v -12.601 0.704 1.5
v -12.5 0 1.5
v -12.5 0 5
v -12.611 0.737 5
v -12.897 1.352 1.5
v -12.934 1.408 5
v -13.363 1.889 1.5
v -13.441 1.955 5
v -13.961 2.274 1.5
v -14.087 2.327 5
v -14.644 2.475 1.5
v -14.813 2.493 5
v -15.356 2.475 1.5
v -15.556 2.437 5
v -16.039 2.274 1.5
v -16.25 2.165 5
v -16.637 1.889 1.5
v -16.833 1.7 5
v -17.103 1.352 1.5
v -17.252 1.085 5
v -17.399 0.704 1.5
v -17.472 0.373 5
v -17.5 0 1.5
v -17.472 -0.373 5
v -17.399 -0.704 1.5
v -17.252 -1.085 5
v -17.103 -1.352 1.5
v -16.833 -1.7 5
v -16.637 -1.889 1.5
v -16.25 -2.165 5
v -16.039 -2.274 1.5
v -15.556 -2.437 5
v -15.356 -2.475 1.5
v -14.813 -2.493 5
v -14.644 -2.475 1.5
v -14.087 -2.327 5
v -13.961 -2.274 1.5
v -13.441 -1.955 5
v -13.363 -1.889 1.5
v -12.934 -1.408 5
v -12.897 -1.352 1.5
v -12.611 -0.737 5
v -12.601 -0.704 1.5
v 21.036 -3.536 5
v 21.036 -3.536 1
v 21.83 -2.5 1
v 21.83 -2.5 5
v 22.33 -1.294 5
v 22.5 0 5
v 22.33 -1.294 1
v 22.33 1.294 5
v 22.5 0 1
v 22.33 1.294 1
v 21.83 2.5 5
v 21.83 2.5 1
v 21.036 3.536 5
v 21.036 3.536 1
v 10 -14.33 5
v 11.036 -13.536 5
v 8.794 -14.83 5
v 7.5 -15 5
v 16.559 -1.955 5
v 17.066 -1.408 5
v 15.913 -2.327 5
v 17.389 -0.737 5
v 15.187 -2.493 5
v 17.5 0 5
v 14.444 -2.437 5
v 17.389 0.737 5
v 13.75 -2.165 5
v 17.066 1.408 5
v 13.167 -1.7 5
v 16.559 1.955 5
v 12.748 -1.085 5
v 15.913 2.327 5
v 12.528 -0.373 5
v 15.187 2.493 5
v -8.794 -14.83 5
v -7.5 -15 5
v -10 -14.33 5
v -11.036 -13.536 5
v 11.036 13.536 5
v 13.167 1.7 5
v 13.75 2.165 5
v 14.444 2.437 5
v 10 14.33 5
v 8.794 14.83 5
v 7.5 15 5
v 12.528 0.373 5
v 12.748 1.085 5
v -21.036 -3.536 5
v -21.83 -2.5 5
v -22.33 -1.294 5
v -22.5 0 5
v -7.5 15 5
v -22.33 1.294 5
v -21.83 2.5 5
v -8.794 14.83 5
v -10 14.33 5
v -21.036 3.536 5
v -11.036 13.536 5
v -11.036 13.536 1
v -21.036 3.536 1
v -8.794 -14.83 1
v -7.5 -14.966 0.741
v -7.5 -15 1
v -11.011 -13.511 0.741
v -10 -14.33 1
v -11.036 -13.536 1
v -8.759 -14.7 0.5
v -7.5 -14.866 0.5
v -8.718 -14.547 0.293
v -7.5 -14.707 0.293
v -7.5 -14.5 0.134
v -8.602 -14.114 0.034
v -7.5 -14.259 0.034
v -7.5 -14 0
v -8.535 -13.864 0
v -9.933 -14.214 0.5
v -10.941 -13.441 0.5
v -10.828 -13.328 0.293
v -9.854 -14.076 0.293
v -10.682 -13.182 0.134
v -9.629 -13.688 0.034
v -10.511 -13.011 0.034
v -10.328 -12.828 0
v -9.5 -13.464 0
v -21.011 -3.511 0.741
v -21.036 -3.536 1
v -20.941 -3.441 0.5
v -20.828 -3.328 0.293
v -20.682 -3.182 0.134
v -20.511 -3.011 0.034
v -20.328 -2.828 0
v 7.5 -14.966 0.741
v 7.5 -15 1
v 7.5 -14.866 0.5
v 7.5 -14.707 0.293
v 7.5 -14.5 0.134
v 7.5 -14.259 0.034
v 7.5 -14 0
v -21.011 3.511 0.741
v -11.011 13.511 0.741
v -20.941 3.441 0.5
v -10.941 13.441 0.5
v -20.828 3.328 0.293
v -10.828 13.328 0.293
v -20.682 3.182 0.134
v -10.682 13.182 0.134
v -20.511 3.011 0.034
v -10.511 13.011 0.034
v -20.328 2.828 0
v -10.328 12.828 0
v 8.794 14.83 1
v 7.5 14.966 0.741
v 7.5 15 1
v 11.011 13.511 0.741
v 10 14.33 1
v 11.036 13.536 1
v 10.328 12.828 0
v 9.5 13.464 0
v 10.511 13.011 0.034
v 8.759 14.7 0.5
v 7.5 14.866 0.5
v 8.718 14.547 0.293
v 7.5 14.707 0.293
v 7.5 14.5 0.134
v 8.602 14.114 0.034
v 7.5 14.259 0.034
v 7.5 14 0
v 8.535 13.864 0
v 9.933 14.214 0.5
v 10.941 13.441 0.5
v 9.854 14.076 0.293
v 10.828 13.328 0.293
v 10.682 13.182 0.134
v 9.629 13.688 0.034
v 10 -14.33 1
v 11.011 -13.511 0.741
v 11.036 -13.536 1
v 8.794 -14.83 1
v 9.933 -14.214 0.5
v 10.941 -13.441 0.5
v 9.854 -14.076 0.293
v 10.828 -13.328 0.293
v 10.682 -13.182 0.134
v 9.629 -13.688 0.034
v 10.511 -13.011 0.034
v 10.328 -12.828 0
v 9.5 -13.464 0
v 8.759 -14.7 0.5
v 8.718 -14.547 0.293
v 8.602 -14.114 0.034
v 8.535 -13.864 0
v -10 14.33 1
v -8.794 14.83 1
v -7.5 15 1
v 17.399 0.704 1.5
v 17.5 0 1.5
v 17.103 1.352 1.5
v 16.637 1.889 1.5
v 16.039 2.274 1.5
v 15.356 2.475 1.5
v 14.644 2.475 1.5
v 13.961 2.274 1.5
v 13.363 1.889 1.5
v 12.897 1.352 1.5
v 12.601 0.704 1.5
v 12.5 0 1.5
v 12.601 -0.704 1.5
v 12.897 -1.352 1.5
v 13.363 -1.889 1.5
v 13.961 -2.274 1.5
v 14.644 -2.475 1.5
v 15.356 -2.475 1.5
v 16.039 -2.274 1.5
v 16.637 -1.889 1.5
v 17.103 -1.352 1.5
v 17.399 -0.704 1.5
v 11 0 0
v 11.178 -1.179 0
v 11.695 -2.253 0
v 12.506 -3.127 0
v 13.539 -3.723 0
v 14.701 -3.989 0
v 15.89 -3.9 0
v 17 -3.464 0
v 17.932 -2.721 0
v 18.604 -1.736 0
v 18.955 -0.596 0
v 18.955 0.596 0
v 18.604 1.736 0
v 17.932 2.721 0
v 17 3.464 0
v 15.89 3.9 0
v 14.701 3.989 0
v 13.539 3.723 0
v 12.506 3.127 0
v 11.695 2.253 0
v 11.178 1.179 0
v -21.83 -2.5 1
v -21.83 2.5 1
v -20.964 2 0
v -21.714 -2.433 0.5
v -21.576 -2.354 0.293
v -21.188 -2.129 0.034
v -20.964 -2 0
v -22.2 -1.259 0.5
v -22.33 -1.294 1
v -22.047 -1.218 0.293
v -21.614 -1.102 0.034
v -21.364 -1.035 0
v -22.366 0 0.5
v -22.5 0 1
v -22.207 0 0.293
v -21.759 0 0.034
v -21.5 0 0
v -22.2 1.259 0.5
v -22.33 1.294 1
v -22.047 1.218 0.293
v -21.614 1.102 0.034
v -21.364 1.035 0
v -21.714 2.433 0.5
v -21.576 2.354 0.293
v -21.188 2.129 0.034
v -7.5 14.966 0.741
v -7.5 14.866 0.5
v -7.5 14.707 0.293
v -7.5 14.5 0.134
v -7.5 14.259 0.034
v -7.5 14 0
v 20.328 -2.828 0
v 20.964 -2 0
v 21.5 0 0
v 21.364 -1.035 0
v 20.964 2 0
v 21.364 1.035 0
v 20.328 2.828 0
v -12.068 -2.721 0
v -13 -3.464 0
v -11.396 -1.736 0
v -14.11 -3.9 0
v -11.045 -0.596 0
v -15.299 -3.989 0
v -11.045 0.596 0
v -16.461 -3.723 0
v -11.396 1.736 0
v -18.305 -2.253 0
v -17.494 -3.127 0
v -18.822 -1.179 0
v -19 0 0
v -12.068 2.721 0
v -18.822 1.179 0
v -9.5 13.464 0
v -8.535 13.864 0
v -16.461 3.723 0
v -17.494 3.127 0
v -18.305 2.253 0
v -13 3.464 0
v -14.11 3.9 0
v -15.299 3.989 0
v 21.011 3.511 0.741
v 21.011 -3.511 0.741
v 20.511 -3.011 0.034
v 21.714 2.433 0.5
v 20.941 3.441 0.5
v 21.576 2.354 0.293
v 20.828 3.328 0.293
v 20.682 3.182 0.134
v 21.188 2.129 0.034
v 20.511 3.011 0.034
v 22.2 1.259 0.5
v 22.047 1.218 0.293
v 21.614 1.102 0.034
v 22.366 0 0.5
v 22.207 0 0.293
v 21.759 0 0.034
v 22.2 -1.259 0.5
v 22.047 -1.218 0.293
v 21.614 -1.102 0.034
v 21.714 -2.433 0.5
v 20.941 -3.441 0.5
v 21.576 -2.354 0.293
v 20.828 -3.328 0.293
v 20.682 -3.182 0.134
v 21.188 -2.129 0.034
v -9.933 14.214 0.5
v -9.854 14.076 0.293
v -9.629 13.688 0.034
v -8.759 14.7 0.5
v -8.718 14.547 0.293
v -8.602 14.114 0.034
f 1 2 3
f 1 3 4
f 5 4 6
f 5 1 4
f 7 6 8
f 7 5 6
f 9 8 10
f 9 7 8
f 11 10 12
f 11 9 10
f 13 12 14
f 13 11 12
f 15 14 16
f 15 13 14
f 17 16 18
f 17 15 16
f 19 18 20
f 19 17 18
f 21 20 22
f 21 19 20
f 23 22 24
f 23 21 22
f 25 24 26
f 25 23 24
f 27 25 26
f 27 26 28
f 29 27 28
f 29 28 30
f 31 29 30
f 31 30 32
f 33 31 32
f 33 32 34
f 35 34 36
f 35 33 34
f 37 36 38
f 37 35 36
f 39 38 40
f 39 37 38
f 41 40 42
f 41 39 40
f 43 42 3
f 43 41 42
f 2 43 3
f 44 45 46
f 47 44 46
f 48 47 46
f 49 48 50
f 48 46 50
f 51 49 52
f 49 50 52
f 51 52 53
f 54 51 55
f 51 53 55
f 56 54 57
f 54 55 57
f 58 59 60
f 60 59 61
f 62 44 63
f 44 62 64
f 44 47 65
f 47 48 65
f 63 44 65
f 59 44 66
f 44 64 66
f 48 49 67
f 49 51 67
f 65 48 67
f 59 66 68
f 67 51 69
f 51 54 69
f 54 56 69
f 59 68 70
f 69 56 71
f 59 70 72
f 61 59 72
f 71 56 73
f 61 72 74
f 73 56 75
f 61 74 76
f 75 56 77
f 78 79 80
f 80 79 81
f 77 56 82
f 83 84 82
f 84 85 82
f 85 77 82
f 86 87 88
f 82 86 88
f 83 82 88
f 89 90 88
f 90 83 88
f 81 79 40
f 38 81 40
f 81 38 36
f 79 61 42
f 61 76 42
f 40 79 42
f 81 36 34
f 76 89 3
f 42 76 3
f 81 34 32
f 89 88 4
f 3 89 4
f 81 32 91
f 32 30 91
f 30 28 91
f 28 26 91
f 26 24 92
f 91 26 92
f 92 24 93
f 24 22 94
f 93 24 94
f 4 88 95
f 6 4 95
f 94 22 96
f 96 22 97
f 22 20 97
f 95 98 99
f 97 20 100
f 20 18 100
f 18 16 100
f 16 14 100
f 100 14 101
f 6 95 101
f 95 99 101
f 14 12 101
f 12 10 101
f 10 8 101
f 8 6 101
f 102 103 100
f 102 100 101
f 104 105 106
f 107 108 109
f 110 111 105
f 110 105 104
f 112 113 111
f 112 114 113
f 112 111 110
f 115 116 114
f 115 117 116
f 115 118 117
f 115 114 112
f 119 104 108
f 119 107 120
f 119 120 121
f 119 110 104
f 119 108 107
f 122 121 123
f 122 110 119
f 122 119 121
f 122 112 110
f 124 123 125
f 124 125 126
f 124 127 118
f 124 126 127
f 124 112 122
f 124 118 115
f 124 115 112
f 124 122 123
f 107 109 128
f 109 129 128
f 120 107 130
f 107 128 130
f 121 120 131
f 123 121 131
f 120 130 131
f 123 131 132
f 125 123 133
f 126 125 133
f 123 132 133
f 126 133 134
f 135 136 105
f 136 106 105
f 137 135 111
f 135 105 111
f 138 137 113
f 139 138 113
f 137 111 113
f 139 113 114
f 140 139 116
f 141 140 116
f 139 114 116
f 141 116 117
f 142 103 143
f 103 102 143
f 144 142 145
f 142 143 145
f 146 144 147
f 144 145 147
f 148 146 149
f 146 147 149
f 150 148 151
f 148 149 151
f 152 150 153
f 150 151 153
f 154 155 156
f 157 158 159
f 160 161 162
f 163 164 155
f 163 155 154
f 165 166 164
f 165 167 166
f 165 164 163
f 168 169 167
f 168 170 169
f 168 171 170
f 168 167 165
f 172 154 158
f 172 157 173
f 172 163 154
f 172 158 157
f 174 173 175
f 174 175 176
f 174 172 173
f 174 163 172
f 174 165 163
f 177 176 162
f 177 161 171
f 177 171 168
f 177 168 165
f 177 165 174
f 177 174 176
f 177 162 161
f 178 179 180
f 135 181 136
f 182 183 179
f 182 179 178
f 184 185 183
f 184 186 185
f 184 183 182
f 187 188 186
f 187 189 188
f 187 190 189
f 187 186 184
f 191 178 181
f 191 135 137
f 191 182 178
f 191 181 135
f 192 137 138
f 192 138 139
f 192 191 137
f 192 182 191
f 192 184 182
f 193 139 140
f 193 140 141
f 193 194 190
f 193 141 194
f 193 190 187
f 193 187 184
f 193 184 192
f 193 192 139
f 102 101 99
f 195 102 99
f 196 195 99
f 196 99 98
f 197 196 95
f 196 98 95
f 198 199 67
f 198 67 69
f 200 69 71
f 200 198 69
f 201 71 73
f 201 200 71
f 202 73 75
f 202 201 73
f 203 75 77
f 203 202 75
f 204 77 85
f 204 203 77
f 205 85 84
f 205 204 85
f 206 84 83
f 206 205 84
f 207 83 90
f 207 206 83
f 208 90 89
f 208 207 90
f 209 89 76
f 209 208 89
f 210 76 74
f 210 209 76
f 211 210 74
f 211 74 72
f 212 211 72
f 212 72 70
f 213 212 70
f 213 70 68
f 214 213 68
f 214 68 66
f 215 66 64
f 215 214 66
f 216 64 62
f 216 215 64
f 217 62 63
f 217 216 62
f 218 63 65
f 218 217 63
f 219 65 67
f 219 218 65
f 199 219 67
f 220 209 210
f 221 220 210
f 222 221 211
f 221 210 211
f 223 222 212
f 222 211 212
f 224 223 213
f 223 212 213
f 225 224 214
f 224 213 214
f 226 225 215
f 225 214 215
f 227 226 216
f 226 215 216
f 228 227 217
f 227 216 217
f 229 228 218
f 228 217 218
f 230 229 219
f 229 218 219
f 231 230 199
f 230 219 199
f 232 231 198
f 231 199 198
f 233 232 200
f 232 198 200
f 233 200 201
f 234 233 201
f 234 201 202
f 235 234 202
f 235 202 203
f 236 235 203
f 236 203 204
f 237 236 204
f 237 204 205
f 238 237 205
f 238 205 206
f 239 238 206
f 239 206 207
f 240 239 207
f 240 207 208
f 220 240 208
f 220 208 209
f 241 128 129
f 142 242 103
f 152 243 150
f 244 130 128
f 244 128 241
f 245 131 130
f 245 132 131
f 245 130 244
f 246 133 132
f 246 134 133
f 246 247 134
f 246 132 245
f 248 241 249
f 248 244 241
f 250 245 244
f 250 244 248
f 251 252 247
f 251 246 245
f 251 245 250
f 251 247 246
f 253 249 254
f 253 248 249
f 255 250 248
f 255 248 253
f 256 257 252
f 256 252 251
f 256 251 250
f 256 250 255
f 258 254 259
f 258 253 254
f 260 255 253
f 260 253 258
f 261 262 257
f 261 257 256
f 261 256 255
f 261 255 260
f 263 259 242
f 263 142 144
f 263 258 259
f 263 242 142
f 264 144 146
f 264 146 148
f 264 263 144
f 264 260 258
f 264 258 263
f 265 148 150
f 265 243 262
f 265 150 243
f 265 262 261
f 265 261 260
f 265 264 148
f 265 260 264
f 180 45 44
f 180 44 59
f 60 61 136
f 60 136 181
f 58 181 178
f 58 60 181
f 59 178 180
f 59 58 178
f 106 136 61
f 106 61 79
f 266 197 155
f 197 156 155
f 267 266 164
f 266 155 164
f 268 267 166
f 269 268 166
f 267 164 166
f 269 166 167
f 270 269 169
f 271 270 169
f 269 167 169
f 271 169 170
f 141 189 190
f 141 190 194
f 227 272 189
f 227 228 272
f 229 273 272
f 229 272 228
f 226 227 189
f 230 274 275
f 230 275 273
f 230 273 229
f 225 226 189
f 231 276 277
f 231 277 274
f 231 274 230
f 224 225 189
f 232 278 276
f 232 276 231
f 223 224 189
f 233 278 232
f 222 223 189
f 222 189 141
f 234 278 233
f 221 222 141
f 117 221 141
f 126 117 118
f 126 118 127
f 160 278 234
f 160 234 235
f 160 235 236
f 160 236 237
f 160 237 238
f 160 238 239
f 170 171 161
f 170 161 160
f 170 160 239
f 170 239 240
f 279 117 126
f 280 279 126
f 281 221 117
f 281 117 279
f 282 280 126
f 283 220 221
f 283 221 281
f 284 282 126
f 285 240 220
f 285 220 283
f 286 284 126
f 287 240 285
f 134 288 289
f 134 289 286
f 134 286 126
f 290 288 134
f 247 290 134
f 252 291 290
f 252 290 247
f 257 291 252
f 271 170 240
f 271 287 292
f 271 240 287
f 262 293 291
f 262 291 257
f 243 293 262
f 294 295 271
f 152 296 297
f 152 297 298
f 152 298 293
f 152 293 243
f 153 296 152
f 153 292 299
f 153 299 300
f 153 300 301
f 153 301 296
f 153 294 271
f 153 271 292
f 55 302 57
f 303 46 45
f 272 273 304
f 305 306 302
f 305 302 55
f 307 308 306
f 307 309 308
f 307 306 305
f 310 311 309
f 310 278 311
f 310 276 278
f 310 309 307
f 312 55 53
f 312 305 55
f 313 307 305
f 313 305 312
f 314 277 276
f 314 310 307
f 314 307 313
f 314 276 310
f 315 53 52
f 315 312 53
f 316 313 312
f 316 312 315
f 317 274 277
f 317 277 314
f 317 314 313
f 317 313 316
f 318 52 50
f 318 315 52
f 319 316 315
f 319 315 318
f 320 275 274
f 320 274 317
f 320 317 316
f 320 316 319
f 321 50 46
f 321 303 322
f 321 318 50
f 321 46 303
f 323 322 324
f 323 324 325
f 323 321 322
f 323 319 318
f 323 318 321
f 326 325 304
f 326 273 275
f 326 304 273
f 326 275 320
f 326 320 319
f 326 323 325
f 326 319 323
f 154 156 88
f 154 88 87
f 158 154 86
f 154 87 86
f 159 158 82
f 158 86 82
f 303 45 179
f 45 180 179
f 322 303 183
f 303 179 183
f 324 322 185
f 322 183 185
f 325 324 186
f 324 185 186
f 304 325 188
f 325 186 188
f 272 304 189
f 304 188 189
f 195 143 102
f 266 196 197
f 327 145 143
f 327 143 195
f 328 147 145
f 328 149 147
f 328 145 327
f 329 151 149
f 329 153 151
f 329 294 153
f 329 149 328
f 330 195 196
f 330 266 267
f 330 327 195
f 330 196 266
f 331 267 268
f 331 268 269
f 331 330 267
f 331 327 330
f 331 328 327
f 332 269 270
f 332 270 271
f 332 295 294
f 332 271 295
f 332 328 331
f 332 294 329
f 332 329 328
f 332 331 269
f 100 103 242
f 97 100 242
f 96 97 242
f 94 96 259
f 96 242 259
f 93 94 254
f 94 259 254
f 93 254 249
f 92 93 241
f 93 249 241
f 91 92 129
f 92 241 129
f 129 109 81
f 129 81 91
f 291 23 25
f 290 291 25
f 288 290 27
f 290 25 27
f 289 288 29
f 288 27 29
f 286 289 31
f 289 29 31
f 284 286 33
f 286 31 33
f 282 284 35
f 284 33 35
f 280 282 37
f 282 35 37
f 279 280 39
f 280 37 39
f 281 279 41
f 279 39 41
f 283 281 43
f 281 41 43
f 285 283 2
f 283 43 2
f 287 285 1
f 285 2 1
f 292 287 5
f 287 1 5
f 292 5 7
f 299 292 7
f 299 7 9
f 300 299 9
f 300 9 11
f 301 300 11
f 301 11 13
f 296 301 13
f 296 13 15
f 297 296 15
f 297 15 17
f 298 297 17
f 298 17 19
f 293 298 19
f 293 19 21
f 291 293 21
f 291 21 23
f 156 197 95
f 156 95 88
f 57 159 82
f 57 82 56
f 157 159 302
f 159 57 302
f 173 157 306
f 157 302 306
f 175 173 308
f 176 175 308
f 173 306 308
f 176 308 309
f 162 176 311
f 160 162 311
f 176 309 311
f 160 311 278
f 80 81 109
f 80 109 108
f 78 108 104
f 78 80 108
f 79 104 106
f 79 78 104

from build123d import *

# Parameters (mm, degrees)
SKETCH_R         = 2.5
PAD_DEPTH        = 5
FILLET_R         = 5
FILLET001_R      = 1
HOLE_D           = 5
HOLE_CSINK_D     = 8
HOLE_CSINK_ANGLE = 90


with BuildPart() as part:
    # Sketch → Pad (new body)
    with BuildSketch(Plane.XY):
        with BuildLine():
            Line((-21.035534, 3.535534), (-9.571068, 15))
            Line((-9.571068, 15), (9.571068, 15))
            Line((9.571068, 15), (21.035534, 3.535534))
            ThreePointArc((21.035534, -3.535534), (22.5, 0), (21.035534, 3.535534))
            Line((21.035534, -3.535534), (9.571068, -15))
            Line((9.571068, -15), (-9.571068, -15))
            Line((-9.571068, -15), (-21.035534, -3.535534))
            ThreePointArc((-21.035534, 3.535534), (-22.5, 0), (-21.035534, -3.535534))
        make_face()
        with Locations((-15, 0)):
            Circle(SKETCH_R, mode=Mode.SUBTRACT)
        with Locations((15, 0)):
            Circle(SKETCH_R, mode=Mode.SUBTRACT)
    extrude(amount=PAD_DEPTH)

    # Fillet
    fillet_edges = [part.edges().sort_by_distance(p)[0] for p in [
        (9.571068, -15, 2.5),
        (-9.571068, -15, 2.5),
        (9.571068, 15, 2.5),
        (-9.571068, 15, 2.5),
    ]]
    fillet(fillet_edges, radius=FILLET_R)

    # Fillet001
    fillet001_edges = [part.edges().sort_by_distance(p)[0] for p in [
        (-16.035534, 8.535534, 0),
        (-9.413417, 14.619398, 0),
        (-22.5, 0, 0),
        (0, 15, 0),
        (-16.035534, -8.535534, 0),
        (9.413417, 14.619398, 0),
        (-9.413417, -14.619398, 0),
        (16.035534, 8.535534, 0),
        (0, -15, 0),
        (22.5, 0, 0),
        (9.413417, -14.619398, 0),
        (16.035534, -8.535534, 0),
        (12.5, 0, 0),
        (-17.5, 0, 0),
    ]]
    fillet(fillet001_edges, radius=FILLET001_R)

    # Hole (through all)
    with Locations(Plane(origin=(0, 0, 0), x_dir=(1, 0, 0), z_dir=(0, 0, -1))):
        with Locations((-15, 0), (15, 0)):
            CounterSinkHole(HOLE_D / 2, HOLE_CSINK_D / 2, counter_sink_angle=HOLE_CSINK_ANGLE)


solid = part.part
